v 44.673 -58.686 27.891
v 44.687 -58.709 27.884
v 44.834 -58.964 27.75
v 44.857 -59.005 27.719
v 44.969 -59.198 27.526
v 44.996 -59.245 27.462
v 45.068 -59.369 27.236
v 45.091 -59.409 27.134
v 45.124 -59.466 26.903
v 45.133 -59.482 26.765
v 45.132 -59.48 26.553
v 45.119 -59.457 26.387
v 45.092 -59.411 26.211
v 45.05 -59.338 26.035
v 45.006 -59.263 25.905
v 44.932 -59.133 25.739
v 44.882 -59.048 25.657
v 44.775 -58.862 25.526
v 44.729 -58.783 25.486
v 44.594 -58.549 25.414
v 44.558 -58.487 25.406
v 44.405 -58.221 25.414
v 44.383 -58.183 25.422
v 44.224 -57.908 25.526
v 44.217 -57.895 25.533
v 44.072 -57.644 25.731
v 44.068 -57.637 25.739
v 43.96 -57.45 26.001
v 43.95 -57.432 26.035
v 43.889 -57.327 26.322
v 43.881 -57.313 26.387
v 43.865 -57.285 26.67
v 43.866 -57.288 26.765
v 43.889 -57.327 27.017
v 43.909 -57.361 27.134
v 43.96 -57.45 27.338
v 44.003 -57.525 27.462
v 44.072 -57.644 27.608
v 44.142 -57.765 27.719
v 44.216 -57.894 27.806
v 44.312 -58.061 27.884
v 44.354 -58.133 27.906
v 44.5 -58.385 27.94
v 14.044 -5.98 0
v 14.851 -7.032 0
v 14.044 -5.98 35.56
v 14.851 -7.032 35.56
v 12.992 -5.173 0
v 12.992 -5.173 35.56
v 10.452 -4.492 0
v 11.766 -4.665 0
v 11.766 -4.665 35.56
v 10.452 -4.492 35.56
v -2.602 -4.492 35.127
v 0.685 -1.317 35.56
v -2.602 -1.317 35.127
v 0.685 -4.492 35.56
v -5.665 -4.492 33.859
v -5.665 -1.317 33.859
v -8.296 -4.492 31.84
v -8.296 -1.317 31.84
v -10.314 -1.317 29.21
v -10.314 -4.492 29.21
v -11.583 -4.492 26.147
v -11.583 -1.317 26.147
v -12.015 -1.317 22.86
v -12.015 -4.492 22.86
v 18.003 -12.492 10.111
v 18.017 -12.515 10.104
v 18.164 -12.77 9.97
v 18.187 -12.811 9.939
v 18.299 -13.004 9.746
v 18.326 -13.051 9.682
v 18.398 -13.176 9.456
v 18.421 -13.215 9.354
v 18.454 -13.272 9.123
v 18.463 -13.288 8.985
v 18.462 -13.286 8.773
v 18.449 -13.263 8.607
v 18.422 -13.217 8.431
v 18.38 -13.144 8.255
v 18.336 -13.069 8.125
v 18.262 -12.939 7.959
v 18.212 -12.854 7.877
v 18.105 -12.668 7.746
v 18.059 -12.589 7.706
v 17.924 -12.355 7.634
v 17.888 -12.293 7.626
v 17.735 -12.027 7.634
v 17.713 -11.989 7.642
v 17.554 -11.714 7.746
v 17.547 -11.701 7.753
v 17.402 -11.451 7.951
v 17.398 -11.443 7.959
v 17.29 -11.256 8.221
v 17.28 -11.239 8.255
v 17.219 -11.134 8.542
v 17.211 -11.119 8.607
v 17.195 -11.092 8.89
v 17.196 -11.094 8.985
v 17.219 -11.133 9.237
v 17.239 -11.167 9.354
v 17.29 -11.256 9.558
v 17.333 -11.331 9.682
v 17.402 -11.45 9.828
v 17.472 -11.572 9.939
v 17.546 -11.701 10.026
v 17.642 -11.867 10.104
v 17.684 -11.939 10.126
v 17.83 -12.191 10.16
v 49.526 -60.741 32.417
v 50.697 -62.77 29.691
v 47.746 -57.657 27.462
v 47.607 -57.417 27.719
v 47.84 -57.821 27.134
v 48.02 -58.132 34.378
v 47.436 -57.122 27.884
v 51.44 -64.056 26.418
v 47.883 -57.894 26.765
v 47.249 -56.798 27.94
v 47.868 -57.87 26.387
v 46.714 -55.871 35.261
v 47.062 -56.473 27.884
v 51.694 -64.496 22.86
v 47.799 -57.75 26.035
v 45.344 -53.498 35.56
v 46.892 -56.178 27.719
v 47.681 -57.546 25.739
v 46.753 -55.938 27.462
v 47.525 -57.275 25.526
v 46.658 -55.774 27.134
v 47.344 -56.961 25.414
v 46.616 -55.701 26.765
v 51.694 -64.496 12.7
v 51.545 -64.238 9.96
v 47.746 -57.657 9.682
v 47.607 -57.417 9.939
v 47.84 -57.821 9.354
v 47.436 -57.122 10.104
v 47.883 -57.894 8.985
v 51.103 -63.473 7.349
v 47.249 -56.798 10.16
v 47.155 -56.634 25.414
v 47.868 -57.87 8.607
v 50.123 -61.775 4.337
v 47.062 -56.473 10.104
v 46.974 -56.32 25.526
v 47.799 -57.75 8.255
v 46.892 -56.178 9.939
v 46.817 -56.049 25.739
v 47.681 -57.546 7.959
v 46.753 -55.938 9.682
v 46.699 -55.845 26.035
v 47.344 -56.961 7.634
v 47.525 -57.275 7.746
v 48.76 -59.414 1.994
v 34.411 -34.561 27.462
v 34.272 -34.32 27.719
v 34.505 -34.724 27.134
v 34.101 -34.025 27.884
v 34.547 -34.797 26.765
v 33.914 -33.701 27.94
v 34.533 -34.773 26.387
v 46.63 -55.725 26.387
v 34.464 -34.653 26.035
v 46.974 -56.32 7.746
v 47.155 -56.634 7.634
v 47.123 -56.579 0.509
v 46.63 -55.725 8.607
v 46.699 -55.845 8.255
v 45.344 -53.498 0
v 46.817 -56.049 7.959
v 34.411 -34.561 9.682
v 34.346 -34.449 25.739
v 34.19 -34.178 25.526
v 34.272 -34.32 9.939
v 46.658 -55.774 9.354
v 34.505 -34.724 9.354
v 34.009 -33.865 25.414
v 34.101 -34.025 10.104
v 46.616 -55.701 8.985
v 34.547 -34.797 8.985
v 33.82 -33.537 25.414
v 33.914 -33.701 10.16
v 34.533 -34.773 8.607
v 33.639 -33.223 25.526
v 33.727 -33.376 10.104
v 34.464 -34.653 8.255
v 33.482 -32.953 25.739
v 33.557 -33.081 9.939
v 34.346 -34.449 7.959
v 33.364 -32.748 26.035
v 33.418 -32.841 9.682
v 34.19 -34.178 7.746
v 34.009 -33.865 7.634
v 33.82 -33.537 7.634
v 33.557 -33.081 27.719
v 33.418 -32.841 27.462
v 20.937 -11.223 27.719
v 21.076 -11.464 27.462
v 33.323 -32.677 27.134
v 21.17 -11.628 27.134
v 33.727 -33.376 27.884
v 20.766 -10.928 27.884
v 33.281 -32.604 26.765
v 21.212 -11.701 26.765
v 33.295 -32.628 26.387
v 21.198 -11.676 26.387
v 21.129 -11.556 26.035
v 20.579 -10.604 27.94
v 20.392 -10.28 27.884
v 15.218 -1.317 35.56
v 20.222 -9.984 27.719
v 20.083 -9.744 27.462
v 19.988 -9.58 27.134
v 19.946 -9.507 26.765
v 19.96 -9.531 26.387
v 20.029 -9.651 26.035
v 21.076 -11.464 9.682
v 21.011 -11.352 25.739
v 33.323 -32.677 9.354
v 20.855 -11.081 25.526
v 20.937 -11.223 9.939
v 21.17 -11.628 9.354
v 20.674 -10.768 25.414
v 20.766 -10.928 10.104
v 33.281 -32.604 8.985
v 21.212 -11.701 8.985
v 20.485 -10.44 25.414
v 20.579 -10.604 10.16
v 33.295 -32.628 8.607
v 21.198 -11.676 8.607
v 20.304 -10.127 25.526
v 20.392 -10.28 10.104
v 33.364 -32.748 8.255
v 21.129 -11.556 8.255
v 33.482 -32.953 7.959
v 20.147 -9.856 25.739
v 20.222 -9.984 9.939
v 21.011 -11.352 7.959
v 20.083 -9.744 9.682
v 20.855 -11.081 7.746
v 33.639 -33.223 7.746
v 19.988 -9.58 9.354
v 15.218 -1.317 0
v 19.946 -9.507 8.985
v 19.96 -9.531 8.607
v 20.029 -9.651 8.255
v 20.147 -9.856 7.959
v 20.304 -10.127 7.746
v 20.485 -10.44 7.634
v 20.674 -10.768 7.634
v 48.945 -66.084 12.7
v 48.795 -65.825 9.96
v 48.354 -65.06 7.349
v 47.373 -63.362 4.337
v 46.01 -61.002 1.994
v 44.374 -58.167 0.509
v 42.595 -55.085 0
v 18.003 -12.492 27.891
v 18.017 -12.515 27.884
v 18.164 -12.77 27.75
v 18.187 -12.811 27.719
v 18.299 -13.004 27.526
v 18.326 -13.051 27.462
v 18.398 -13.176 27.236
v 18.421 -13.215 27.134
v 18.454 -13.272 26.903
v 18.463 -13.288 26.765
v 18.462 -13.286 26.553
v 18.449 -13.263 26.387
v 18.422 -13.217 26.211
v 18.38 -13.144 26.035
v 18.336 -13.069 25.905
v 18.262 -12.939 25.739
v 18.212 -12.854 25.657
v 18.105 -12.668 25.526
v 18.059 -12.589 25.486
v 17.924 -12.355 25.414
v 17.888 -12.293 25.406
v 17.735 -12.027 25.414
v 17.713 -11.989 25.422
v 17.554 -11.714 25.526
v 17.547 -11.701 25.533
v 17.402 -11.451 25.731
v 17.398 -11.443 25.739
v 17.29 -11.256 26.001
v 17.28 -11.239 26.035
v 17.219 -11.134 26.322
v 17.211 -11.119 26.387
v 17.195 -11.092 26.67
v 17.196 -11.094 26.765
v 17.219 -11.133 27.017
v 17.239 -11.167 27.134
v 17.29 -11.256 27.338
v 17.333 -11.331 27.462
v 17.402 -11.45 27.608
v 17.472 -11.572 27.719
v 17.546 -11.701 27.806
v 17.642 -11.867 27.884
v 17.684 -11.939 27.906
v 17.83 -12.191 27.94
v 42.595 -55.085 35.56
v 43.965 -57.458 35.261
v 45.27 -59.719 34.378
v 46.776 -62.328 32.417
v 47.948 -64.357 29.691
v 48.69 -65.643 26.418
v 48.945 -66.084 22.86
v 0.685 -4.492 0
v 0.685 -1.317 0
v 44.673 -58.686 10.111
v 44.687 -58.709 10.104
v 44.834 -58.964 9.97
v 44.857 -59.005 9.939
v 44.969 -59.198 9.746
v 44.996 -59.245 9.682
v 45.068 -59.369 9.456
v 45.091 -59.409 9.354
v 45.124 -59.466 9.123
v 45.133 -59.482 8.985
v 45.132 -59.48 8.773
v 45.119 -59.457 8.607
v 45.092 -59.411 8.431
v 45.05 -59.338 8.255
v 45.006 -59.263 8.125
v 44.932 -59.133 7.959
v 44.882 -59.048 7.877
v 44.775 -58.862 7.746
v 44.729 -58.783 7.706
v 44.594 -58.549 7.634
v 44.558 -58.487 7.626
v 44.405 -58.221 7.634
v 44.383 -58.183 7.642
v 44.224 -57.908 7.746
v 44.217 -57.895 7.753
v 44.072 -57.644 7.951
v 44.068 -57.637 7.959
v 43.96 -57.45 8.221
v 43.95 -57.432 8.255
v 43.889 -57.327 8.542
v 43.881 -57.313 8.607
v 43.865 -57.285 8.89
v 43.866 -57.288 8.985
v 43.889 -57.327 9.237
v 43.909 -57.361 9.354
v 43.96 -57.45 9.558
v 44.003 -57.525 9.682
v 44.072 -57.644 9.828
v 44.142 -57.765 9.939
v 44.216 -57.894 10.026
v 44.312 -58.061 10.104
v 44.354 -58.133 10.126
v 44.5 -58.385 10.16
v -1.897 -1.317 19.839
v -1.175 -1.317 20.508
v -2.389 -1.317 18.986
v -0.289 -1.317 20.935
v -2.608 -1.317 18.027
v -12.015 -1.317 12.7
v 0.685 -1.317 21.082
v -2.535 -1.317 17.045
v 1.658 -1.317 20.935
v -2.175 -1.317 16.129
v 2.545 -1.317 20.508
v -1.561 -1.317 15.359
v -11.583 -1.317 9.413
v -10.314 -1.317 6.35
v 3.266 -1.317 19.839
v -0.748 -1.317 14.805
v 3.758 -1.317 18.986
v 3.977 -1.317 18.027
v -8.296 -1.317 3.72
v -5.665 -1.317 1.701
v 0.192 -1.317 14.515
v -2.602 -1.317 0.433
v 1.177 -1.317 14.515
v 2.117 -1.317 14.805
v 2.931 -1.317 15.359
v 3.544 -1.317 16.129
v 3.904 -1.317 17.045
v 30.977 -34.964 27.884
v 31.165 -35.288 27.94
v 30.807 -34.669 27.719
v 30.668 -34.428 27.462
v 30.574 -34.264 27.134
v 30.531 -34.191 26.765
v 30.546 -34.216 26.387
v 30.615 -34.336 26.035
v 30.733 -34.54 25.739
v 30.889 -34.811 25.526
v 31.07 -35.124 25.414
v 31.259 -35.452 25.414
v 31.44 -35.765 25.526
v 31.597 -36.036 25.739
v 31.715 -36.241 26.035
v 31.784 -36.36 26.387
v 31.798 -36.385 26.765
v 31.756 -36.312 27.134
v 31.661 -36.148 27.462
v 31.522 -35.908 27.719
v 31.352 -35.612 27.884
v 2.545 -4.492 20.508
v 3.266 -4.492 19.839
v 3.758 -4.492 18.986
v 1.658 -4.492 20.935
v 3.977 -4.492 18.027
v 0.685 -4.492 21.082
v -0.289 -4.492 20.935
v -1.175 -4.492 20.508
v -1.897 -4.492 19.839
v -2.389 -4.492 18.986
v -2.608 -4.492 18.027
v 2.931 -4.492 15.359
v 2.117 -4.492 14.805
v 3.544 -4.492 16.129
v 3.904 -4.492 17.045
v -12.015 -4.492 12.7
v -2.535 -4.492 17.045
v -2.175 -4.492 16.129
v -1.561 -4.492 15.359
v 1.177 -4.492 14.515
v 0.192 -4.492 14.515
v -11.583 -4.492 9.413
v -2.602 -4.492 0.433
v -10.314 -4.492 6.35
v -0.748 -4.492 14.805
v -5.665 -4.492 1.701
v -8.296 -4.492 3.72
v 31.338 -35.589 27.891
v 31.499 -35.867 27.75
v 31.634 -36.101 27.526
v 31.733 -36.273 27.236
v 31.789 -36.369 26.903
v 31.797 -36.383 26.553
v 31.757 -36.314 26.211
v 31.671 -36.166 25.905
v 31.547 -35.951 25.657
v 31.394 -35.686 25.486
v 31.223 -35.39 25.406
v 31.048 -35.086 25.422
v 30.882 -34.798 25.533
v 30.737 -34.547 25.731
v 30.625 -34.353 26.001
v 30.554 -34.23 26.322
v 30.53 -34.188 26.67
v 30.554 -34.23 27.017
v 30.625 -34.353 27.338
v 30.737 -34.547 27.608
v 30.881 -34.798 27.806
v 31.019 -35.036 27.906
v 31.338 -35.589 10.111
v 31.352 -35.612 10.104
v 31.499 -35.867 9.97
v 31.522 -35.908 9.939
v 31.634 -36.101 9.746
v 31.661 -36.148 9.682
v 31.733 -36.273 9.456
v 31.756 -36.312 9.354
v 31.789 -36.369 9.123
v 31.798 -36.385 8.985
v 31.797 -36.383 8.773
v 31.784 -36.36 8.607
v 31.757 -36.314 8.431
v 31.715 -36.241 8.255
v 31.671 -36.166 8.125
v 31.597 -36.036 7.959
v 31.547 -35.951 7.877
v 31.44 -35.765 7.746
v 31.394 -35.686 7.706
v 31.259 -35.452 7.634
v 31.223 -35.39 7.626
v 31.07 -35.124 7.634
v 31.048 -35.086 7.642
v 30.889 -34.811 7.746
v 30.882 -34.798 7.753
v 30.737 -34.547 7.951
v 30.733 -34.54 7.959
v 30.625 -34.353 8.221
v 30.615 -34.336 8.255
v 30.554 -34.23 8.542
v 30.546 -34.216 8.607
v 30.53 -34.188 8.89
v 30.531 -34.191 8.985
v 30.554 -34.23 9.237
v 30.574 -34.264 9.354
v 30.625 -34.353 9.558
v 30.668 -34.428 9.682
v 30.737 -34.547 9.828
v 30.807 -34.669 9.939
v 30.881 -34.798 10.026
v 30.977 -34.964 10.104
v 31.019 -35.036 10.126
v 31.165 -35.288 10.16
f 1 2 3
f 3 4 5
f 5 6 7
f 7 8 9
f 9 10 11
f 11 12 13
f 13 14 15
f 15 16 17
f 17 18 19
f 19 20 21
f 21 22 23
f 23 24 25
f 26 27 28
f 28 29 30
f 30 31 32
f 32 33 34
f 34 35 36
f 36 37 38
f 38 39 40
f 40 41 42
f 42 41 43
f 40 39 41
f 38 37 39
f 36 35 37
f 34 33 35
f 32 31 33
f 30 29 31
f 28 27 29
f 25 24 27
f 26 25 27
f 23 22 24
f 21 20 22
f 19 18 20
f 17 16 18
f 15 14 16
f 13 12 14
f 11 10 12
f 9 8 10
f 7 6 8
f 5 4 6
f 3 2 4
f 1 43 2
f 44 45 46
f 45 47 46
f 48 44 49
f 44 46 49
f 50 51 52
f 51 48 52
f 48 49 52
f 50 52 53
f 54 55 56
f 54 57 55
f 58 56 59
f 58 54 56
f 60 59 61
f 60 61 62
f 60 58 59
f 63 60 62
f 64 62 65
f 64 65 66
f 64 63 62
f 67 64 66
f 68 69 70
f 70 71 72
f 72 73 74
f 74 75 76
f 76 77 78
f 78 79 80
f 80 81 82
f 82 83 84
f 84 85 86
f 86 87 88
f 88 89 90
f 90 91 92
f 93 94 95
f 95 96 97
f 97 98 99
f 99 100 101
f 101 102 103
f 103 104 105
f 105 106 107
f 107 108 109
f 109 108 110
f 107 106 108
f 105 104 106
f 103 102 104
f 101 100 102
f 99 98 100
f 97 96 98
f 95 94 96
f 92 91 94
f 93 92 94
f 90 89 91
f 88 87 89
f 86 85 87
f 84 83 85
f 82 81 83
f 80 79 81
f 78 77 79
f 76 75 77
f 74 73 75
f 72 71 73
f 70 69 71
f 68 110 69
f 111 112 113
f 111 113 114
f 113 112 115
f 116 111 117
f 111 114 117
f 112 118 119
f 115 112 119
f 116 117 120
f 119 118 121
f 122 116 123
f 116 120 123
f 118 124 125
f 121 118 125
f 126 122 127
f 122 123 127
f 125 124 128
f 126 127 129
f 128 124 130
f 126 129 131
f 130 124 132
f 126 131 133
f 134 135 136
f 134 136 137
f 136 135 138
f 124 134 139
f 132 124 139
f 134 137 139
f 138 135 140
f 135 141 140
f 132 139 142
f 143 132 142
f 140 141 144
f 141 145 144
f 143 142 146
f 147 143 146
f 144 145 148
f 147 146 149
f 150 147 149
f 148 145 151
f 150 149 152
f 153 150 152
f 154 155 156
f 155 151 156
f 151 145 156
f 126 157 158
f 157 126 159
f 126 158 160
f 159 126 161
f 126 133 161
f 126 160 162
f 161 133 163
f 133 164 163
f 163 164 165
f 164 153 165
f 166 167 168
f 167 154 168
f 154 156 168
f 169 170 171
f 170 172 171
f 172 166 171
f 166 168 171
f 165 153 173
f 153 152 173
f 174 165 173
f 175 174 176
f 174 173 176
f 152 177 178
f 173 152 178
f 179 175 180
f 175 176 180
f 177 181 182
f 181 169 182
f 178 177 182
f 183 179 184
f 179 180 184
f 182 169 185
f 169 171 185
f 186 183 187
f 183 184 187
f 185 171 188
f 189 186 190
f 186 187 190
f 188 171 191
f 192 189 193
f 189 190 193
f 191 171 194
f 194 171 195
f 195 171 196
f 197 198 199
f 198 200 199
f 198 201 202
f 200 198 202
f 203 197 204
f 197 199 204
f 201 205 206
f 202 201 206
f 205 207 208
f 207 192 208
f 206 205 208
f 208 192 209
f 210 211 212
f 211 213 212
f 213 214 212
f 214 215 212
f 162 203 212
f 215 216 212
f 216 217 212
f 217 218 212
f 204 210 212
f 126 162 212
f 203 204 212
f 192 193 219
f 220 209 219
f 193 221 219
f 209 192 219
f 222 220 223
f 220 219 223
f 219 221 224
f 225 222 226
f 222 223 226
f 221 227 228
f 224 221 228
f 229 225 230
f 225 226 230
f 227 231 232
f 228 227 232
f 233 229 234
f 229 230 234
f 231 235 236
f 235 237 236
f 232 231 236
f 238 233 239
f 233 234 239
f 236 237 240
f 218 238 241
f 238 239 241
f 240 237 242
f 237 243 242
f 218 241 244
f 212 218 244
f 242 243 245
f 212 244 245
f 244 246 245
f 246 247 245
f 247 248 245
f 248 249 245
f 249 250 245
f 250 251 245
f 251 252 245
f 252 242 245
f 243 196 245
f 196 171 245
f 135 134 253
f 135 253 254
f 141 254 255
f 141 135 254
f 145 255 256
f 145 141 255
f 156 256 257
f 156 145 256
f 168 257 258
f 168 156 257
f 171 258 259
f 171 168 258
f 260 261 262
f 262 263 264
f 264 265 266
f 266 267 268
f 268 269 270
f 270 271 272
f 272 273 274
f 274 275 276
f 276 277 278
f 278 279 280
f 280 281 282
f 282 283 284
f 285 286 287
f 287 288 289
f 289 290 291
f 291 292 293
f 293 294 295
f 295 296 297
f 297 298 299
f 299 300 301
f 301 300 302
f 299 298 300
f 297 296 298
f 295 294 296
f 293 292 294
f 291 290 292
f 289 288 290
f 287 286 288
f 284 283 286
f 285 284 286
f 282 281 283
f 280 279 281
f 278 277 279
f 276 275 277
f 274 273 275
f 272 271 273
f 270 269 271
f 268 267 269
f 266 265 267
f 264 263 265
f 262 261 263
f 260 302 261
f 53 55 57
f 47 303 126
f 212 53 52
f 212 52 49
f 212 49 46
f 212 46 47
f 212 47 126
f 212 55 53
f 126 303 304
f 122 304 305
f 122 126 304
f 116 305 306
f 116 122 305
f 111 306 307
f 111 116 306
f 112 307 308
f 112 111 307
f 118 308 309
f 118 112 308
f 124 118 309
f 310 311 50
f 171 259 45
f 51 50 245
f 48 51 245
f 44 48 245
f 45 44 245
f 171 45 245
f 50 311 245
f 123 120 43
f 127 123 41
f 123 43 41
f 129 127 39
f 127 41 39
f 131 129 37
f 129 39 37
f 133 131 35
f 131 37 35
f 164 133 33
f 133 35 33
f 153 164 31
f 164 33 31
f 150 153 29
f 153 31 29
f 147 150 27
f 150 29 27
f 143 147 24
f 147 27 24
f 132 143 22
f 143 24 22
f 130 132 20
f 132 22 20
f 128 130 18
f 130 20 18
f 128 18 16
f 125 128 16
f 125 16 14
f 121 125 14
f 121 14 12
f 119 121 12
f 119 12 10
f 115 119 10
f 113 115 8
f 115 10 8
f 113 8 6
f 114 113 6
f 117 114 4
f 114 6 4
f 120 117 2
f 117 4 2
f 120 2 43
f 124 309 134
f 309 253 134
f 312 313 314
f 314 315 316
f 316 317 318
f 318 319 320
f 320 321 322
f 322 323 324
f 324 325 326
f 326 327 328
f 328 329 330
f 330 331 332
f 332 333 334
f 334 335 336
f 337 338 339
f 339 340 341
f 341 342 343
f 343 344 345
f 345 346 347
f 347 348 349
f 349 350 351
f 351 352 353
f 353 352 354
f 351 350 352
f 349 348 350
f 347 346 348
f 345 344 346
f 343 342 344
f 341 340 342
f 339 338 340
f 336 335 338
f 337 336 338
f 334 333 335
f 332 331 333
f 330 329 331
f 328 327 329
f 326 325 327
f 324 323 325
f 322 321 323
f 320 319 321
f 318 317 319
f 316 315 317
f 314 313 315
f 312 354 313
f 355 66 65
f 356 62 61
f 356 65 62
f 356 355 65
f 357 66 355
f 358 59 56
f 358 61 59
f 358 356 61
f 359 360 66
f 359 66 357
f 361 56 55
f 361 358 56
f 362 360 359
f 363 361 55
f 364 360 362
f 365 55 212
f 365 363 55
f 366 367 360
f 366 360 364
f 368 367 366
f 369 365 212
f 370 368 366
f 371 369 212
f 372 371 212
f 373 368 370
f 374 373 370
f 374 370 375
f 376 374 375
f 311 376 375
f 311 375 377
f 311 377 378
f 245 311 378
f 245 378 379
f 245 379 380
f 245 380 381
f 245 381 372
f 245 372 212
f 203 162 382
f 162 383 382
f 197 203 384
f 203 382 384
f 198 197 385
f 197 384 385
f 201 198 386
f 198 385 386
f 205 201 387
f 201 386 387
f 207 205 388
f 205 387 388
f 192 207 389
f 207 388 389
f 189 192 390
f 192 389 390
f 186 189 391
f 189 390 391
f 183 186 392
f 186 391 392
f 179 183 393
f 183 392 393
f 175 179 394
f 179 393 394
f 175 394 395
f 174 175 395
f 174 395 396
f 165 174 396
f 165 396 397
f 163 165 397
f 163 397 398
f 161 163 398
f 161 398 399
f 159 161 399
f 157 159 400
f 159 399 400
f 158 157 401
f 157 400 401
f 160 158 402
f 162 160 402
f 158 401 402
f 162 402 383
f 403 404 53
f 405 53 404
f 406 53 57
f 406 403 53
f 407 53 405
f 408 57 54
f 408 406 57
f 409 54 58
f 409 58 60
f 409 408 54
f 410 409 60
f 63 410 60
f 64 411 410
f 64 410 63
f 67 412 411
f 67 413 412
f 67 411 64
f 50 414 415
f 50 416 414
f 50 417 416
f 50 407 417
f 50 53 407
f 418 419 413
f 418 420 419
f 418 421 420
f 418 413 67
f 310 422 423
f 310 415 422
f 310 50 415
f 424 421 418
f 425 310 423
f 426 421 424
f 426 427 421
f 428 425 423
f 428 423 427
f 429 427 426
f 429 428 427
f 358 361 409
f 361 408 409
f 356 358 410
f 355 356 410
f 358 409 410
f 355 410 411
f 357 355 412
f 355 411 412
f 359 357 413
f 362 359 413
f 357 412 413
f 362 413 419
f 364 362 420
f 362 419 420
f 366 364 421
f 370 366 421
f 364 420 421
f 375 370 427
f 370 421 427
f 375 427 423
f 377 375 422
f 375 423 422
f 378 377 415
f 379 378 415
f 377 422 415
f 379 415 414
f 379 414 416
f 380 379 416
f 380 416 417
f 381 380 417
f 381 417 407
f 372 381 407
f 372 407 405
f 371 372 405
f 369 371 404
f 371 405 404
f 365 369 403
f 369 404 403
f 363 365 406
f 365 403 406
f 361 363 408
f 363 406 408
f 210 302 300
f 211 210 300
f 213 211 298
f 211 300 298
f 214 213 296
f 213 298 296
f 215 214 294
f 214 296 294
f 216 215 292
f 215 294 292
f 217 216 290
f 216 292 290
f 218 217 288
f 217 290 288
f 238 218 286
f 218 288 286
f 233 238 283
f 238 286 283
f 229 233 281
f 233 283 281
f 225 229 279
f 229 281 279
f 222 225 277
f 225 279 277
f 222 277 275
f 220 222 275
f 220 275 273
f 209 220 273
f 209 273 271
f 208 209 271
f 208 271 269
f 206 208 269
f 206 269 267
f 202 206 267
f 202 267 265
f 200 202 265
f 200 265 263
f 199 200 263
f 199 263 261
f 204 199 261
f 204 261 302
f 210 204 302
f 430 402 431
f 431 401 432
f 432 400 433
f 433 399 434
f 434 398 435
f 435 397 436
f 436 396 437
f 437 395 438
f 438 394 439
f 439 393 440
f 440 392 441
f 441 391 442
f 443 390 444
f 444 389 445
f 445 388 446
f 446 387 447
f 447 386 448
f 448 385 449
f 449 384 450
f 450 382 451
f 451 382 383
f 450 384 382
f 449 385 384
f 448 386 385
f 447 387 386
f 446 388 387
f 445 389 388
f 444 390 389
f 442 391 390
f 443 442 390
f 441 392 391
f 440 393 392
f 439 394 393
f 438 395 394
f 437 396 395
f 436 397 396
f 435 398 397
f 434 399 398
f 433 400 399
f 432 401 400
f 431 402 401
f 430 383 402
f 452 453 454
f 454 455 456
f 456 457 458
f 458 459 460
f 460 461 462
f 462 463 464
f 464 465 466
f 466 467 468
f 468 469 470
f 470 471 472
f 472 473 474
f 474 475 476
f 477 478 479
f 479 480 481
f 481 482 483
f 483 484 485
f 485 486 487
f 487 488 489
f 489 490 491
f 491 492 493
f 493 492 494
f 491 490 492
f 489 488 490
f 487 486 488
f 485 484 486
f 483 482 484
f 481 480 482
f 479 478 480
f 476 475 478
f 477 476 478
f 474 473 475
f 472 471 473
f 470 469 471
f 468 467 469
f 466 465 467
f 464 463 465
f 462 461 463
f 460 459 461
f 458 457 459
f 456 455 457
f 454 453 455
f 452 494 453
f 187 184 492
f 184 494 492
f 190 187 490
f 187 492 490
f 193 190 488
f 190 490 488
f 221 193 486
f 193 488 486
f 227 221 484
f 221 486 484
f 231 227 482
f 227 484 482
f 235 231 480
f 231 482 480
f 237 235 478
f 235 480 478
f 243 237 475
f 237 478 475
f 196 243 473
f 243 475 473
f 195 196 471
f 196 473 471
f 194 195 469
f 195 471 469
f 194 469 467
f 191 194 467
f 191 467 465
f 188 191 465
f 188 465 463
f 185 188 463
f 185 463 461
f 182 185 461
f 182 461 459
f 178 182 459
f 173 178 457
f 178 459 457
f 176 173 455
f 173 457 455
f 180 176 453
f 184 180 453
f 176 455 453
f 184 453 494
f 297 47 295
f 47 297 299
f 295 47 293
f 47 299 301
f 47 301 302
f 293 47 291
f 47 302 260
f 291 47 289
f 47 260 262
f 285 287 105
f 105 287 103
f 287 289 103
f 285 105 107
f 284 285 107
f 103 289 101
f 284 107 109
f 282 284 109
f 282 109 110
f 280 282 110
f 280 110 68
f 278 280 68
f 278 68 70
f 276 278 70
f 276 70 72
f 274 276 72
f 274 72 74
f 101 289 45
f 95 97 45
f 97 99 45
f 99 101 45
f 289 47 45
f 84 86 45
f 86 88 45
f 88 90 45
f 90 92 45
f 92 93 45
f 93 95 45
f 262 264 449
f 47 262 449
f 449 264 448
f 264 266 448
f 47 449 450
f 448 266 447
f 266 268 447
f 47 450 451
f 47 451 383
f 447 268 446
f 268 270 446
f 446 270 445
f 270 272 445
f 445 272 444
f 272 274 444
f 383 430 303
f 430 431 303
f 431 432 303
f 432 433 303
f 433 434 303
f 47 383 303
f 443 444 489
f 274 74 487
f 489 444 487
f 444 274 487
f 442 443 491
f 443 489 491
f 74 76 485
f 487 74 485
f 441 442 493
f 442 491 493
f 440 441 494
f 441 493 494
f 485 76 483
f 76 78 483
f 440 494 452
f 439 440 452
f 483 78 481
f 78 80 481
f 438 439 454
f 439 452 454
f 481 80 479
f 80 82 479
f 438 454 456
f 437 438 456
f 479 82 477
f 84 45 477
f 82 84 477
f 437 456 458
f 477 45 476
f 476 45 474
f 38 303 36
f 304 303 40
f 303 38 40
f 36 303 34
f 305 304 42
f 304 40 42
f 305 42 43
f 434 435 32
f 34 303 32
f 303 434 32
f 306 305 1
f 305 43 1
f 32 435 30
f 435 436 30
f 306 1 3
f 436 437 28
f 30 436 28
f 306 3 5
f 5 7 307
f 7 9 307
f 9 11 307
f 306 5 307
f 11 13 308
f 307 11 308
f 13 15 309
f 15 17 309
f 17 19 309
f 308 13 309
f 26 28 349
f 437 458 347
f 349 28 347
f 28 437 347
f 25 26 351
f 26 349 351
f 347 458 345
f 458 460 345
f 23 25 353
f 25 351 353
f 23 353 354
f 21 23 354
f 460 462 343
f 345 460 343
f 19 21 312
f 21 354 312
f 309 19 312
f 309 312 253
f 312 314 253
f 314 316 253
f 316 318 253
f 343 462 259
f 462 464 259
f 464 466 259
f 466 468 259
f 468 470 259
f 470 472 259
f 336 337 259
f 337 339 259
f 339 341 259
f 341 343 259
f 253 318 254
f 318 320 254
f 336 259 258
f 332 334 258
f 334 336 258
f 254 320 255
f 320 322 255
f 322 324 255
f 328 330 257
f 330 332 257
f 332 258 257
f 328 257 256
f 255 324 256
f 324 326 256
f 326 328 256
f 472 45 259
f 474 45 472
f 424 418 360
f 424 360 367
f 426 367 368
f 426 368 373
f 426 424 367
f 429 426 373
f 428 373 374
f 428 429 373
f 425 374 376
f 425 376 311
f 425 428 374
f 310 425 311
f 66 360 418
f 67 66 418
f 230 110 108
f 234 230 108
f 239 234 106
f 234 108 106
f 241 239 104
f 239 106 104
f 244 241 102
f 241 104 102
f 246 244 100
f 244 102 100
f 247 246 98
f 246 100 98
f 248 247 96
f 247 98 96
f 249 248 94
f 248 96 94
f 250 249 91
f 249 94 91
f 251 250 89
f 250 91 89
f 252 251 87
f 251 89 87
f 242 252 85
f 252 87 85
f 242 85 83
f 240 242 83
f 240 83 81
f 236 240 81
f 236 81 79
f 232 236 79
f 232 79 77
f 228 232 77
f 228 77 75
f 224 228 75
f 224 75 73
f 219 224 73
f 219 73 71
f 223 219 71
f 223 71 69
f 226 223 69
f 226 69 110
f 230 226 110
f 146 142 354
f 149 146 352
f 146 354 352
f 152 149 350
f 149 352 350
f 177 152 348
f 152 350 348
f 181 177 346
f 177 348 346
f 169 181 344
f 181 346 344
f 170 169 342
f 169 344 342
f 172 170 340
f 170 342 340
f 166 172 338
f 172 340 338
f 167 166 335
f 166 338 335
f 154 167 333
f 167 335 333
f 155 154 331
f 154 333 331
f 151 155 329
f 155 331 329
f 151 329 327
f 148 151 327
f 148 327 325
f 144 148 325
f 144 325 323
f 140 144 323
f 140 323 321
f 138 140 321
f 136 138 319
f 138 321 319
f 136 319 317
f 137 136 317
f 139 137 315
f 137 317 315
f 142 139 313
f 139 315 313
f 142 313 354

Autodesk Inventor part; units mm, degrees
ref_plane "YZ Plane" through (0, 0, 0) normal (1, 0, 0) x (0, 1, 0)
ref_plane "XZ Plane" through (0, 0, 0) normal (0, 1, 0) x (-1, 0, 0)
ref_plane "XY Plane" through (0, 0, 0) normal (0, 0, 1) x (1, 0, 0)
sketch "Sketch1" plane through (0, 0, 0) normal (0, 0, 1) x (1, 0, 0)
  line L0 (13.3846, -4.4923) -> (-12.0154, -4.4923)
  line L1 (-12.0154, -1.3173) -> (-12.0154, -4.4923)
  line L2 (13.3846, -4.4923) -> (84.5046, -4.4923) construction
  line L3 (13.3846, -4.4923) -> (84.5046, -4.4923) construction
  line L4 (13.3846, -4.4923) -> (84.5046, -4.4923) construction
  line L5 (13.3846, -4.4923) -> (48.9446, -66.084)
  line L6 (13.3846, -4.4923) -> (84.5046, -4.4923) construction
  line L7 (48.9446, -66.084) -> (51.6943, -64.4965)
  line L8 (-12.0154, -1.3173) -> (15.2177, -1.3173)
  line L9 (51.6943, -64.4965) -> (15.2177, -1.3173)
  dimension "d13" = 3.175
  dimension "d30" = 71.12
  dimension "d31" = 60
  dimension "d32" = 3.175
extrude "Extrusion1" add sketch "Sketch1" along normal blind 35.56
sketch "Sketch2" plane through (-12.0154, -1.3173, 0) normal (0, 1, 0) x (1, 0, 0)
  line L0 (0, 0) -> (27.2331, 0) projected
  line L1 (0, 0) -> (0, -35.56) projected
  point P0 (12.0154, 0)
  point P1 (12.7, -17.78)
  dimension "d45" = 17.78
  dimension "d46" = 12.7
hole "Hole1" at (0.6846, -1.3173, 17.78) direction (0, -1, 0) diameter 6.604 depth 3.175 tip angle 118
sketch "Sketch3" plane through (15.2177, -1.3173, 35.56) normal (0.866, 0.5, 0) x (0, 0, -1)
  line L0 (35.56, -72.9531) -> (0, -72.9531) projected
  line L1 (35.56, 0) -> (35.56, -72.9531) projected
  point P0 (35.56, 8.7496)
  point P1 (26.67, -64.0631)
  dimension "d47" = 8.89
  dimension "d48" = 8.89
hole "Hole2" at (47.2493, -56.7975, 8.89) direction (-0.866, -0.5, 0) diameter 2.54 depth 3.175 tip angle 118
sketch "Sketch4" plane through (15.2177, -1.3173, 35.56) normal (0.866, 0.5, 0) x (0, 0, -1)
  line L0 (0, -72.9531) -> (0, 0) projected
  line L1 (35.56, -72.9531) -> (0, -72.9531) projected
  point P0 (35.56, 8.7496)
  point P1 (8.89, -64.0631)
  dimension "d56" = 8.89
  dimension "d57" = 8.89
hole "Hole3" at (47.2493, -56.7975, 26.67) direction (-0.866, -0.5, 0) diameter 2.54 depth 3.175 tip angle 118
sketch "Sketch5" plane through (15.2177, -1.3173, 35.56) normal (0.866, 0.5, 0) x (0, 0, -1)
  line L0 (0, -72.9531) -> (0, 0) projected
  line L1 (35.56, -72.9531) -> (0, -72.9531) projected
  point P0 (35.56, 8.7496)
  point P1 (8.89, -37.3931)
  dimension "d65" = 8.89
  dimension "d66" = 35.56
hole "Hole4" at (33.9143, -33.7006, 26.67) direction (-0.866, -0.5, 0) diameter 2.54 depth 3.175 tip angle 118
sketch "Sketch6" plane through (15.2177, -1.3173, 35.56) normal (0.866, 0.5, 0) x (0, 0, -1)
  line L0 (35.56, 0) -> (35.56, -72.9531) projected
  line L1 (35.56, -72.9531) -> (0, -72.9531) projected
  point P0 (35.56, 8.7496)
  point P1 (26.67, -37.3931)
  dimension "d74" = 8.89
  dimension "d75" = 35.56
hole "Hole5" at (33.9143, -33.7006, 8.89) direction (-0.866, -0.5, 0) diameter 2.54 depth 3.175 tip angle 118
sketch "Sketch7" plane through (15.2177, -1.3173, 35.56) normal (0.866, 0.5, 0) x (0, 0, -1)
  line L0 (35.56, 0) -> (35.56, -72.9531) projected
  line L1 (35.56, 0) -> (0, 0) projected
  circle A0 centre (26.67, -37.3931) radius 1.27 projected
  point P0 (35.56, 8.7496)
  point P1 (26.67, -10.7231)
  dimension "d83" = 8.89
  dimension "d101" = 26.67
hole "Hole6" at (20.5793, -10.6037, 8.89) direction (-0.866, -0.5, 0) diameter 2.54 depth 3.175 tip angle 118
sketch "Sketch8" plane through (15.2177, -1.3173, 35.56) normal (0.866, 0.5, 0) x (0, 0, -1)
  line L0 (35.56, 0) -> (0, 0) projected
  line L1 (0, -72.9531) -> (0, 0) projected
  circle A0 centre (8.89, -37.3931) radius 1.27 projected
  point P0 (35.56, 8.7496)
  point P1 (8.89, -10.7231)
  dimension "d93" = 8.89
  dimension "d102" = 26.67
hole "Hole7" at (20.5793, -10.6037, 26.67) direction (-0.866, -0.5, 0) diameter 2.54 depth 3.175 tip angle 118
fillet "Fillet1" radius 12.7 1 edges at (50.3194, -65.2902, 0)
fillet "Fillet2" radius 12.7 1 edges at (50.3194, -65.2902, 35.56)
fillet "Fillet3" radius 12.7 1 edges at (-12.0154, -2.9048, 35.56)
fillet "Fillet4" radius 12.7 1 edges at (-12.0154, -2.9048, 0)
fillet "Fillet5" radius 5.08 1 edges at (13.3846, -4.4923, 17.78)
properties part number "matrix_holder"
